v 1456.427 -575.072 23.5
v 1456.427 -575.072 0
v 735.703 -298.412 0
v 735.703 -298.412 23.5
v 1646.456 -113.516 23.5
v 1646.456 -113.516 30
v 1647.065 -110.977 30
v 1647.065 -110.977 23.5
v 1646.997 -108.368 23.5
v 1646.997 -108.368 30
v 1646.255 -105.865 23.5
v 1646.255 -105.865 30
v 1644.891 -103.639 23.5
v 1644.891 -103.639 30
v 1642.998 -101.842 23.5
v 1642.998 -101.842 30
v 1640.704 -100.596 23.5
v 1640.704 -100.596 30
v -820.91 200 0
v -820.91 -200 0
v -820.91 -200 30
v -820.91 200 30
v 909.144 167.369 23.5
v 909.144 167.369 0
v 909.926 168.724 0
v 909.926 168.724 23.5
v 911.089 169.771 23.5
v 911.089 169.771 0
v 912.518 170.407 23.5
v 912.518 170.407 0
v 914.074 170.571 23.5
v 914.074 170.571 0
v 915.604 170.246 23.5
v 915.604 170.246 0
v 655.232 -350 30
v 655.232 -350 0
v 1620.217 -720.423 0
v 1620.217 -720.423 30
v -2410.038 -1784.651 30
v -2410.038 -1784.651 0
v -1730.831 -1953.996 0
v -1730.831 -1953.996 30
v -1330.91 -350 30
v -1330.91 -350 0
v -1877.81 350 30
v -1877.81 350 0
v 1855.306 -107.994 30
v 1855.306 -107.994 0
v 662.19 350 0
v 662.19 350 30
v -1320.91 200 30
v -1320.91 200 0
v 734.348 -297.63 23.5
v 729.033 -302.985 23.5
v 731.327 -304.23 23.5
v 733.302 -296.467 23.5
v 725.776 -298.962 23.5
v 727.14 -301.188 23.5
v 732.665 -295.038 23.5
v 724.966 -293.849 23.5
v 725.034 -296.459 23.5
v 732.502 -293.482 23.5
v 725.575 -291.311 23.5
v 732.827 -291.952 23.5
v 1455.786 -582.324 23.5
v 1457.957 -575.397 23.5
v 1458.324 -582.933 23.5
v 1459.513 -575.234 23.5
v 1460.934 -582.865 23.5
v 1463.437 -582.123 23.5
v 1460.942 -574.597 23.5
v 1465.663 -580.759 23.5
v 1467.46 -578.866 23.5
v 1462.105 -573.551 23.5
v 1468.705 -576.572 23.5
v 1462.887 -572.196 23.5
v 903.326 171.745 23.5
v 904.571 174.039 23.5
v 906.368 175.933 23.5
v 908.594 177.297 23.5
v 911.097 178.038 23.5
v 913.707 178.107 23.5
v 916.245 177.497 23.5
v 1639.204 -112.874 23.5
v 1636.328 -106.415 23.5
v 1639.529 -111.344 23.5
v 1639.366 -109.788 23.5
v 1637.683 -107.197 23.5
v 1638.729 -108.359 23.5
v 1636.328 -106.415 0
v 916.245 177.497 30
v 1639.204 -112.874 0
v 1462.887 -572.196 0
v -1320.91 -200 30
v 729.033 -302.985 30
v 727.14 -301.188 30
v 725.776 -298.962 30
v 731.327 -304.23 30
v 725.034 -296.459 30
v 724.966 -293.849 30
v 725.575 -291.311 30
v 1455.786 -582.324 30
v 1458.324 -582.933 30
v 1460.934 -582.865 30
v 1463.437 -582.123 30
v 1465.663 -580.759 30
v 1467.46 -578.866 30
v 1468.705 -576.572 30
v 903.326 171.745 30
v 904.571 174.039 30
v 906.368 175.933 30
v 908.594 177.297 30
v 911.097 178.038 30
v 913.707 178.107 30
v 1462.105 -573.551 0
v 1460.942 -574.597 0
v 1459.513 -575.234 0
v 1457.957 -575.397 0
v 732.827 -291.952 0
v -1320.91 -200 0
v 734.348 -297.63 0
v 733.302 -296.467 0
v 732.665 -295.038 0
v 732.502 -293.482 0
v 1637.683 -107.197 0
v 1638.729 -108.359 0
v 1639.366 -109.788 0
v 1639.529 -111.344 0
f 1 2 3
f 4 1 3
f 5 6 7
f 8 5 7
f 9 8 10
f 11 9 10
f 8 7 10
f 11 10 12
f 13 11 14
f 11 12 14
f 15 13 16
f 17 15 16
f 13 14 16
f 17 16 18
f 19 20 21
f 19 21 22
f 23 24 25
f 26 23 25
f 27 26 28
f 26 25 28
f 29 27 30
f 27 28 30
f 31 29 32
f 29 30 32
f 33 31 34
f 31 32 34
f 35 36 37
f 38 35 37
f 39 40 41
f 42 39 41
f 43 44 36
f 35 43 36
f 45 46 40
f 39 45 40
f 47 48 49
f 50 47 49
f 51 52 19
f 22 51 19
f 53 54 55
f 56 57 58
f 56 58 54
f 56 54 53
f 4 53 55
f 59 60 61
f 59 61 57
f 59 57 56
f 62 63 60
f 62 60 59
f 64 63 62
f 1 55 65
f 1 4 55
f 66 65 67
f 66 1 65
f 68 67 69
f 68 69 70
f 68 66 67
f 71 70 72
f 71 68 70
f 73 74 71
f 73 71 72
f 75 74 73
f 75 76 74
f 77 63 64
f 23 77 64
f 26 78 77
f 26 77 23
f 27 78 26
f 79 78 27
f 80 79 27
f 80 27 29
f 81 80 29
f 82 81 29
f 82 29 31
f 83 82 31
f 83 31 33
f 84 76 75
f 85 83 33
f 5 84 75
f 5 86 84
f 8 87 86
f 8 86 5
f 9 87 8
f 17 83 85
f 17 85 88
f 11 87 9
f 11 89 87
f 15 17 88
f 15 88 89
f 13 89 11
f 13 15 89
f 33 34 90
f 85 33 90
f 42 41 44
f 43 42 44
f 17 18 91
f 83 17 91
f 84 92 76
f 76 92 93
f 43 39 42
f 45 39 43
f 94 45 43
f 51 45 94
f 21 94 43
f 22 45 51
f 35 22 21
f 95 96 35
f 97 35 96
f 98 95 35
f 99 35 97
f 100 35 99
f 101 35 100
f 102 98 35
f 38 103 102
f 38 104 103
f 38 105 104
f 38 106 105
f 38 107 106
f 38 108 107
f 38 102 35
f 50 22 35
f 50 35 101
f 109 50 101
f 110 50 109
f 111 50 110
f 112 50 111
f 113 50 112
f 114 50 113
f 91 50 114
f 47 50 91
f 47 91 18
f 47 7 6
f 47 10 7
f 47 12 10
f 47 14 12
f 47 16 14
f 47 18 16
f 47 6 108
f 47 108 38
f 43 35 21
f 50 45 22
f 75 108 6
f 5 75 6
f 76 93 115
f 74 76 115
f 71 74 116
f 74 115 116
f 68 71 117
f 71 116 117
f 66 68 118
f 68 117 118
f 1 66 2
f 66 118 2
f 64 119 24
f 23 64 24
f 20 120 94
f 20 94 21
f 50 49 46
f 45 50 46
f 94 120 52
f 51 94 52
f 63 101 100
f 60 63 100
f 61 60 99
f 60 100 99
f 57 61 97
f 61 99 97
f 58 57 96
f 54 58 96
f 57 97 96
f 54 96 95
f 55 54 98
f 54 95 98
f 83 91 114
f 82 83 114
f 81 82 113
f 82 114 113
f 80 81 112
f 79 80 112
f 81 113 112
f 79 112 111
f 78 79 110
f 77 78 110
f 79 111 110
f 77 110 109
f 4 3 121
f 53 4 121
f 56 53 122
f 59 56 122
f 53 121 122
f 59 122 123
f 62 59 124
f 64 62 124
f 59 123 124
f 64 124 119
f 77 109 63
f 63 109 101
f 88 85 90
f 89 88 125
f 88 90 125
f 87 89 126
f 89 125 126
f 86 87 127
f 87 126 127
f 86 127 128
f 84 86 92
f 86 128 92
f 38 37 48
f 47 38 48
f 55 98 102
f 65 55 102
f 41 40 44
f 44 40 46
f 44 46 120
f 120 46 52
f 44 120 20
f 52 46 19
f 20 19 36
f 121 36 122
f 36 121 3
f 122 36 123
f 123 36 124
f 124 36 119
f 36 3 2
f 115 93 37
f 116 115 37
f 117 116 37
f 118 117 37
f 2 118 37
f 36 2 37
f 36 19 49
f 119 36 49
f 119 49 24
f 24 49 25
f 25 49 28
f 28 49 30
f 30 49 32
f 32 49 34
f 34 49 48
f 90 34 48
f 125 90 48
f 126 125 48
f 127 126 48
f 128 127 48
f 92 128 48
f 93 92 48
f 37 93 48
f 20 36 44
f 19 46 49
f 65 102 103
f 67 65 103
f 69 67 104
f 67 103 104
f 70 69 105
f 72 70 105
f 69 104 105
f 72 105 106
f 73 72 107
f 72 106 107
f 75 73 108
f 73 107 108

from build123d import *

# Parameters (mm, degrees)
F0_W     = 500
F0_H     = 400
F1_DEPTH = 30
F3_DEPTH = 6.5


with BuildPart() as f1:
    # F0 (on Top) → F1 (new body)
    with BuildSketch(Plane.XY):
        Polygon((-1330.909668, -350), (655.231899, -350), (1620.216804, -720.422999), (1855.306179, -107.99424), (662.190394, 350), (-1877.809606, 350), (-2410.037776, -1784.650598), (-1730.830768, -1953.995925), align=None)
        with Locations((-1070.909668, 0)):
            Rectangle(F0_W, F0_H, mode=Mode.SUBTRACT)
        with BuildLine():
            ThreePointArc((909.144028, 167.369492), (911.778247, 170.14538), (915.60377, 170.245554))
            Line((915.60377, 170.245554), (1636.327859, -106.414503))
            ThreePointArc((1636.327859, -106.414503), (1639.103747, -109.048722), (1639.203922, -112.874245))
            Line((1639.203922, -112.874245), (1462.886891, -572.195814))
            ThreePointArc((1462.886891, -572.195814), (1460.252672, -574.971702), (1456.427149, -575.071877))
            Line((1456.427149, -575.071877), (735.703059, -298.41182))
            ThreePointArc((735.703059, -298.41182), (732.927172, -295.777601), (732.826997, -291.952078))
            Line((732.826997, -291.952078), (909.144028, 167.369492))
        make_face(mode=Mode.SUBTRACT)
    extrude(amount=F1_DEPTH)

    # F2 (on face) → F3 (cut)
    with BuildSketch(Plane.XY.offset(30)):
        with BuildLine():
            Line((1640.703596, -100.596176), (916.245185, 177.497353))
            ThreePointArc((916.245185, 177.497353), (908.594139, 177.297004), (903.325701, 171.745228))
            Line((903.325701, 171.745228), (725.575198, -291.310663))
            ThreePointArc((725.575198, -291.310663), (725.775548, -298.961709), (731.327323, -304.230147))
            Line((731.327323, -304.230147), (1455.785734, -582.323676))
            ThreePointArc((1455.785734, -582.323676), (1463.43678, -582.123326), (1468.705218, -576.571551))
            Line((1468.705218, -576.571551), (1646.455721, -113.515659))
            ThreePointArc((1646.455721, -113.515659), (1646.255371, -105.864613), (1640.703596, -100.596176))
        make_face()
    extrude(amount=-F3_DEPTH, mode=Mode.SUBTRACT)


solid = f1.part
